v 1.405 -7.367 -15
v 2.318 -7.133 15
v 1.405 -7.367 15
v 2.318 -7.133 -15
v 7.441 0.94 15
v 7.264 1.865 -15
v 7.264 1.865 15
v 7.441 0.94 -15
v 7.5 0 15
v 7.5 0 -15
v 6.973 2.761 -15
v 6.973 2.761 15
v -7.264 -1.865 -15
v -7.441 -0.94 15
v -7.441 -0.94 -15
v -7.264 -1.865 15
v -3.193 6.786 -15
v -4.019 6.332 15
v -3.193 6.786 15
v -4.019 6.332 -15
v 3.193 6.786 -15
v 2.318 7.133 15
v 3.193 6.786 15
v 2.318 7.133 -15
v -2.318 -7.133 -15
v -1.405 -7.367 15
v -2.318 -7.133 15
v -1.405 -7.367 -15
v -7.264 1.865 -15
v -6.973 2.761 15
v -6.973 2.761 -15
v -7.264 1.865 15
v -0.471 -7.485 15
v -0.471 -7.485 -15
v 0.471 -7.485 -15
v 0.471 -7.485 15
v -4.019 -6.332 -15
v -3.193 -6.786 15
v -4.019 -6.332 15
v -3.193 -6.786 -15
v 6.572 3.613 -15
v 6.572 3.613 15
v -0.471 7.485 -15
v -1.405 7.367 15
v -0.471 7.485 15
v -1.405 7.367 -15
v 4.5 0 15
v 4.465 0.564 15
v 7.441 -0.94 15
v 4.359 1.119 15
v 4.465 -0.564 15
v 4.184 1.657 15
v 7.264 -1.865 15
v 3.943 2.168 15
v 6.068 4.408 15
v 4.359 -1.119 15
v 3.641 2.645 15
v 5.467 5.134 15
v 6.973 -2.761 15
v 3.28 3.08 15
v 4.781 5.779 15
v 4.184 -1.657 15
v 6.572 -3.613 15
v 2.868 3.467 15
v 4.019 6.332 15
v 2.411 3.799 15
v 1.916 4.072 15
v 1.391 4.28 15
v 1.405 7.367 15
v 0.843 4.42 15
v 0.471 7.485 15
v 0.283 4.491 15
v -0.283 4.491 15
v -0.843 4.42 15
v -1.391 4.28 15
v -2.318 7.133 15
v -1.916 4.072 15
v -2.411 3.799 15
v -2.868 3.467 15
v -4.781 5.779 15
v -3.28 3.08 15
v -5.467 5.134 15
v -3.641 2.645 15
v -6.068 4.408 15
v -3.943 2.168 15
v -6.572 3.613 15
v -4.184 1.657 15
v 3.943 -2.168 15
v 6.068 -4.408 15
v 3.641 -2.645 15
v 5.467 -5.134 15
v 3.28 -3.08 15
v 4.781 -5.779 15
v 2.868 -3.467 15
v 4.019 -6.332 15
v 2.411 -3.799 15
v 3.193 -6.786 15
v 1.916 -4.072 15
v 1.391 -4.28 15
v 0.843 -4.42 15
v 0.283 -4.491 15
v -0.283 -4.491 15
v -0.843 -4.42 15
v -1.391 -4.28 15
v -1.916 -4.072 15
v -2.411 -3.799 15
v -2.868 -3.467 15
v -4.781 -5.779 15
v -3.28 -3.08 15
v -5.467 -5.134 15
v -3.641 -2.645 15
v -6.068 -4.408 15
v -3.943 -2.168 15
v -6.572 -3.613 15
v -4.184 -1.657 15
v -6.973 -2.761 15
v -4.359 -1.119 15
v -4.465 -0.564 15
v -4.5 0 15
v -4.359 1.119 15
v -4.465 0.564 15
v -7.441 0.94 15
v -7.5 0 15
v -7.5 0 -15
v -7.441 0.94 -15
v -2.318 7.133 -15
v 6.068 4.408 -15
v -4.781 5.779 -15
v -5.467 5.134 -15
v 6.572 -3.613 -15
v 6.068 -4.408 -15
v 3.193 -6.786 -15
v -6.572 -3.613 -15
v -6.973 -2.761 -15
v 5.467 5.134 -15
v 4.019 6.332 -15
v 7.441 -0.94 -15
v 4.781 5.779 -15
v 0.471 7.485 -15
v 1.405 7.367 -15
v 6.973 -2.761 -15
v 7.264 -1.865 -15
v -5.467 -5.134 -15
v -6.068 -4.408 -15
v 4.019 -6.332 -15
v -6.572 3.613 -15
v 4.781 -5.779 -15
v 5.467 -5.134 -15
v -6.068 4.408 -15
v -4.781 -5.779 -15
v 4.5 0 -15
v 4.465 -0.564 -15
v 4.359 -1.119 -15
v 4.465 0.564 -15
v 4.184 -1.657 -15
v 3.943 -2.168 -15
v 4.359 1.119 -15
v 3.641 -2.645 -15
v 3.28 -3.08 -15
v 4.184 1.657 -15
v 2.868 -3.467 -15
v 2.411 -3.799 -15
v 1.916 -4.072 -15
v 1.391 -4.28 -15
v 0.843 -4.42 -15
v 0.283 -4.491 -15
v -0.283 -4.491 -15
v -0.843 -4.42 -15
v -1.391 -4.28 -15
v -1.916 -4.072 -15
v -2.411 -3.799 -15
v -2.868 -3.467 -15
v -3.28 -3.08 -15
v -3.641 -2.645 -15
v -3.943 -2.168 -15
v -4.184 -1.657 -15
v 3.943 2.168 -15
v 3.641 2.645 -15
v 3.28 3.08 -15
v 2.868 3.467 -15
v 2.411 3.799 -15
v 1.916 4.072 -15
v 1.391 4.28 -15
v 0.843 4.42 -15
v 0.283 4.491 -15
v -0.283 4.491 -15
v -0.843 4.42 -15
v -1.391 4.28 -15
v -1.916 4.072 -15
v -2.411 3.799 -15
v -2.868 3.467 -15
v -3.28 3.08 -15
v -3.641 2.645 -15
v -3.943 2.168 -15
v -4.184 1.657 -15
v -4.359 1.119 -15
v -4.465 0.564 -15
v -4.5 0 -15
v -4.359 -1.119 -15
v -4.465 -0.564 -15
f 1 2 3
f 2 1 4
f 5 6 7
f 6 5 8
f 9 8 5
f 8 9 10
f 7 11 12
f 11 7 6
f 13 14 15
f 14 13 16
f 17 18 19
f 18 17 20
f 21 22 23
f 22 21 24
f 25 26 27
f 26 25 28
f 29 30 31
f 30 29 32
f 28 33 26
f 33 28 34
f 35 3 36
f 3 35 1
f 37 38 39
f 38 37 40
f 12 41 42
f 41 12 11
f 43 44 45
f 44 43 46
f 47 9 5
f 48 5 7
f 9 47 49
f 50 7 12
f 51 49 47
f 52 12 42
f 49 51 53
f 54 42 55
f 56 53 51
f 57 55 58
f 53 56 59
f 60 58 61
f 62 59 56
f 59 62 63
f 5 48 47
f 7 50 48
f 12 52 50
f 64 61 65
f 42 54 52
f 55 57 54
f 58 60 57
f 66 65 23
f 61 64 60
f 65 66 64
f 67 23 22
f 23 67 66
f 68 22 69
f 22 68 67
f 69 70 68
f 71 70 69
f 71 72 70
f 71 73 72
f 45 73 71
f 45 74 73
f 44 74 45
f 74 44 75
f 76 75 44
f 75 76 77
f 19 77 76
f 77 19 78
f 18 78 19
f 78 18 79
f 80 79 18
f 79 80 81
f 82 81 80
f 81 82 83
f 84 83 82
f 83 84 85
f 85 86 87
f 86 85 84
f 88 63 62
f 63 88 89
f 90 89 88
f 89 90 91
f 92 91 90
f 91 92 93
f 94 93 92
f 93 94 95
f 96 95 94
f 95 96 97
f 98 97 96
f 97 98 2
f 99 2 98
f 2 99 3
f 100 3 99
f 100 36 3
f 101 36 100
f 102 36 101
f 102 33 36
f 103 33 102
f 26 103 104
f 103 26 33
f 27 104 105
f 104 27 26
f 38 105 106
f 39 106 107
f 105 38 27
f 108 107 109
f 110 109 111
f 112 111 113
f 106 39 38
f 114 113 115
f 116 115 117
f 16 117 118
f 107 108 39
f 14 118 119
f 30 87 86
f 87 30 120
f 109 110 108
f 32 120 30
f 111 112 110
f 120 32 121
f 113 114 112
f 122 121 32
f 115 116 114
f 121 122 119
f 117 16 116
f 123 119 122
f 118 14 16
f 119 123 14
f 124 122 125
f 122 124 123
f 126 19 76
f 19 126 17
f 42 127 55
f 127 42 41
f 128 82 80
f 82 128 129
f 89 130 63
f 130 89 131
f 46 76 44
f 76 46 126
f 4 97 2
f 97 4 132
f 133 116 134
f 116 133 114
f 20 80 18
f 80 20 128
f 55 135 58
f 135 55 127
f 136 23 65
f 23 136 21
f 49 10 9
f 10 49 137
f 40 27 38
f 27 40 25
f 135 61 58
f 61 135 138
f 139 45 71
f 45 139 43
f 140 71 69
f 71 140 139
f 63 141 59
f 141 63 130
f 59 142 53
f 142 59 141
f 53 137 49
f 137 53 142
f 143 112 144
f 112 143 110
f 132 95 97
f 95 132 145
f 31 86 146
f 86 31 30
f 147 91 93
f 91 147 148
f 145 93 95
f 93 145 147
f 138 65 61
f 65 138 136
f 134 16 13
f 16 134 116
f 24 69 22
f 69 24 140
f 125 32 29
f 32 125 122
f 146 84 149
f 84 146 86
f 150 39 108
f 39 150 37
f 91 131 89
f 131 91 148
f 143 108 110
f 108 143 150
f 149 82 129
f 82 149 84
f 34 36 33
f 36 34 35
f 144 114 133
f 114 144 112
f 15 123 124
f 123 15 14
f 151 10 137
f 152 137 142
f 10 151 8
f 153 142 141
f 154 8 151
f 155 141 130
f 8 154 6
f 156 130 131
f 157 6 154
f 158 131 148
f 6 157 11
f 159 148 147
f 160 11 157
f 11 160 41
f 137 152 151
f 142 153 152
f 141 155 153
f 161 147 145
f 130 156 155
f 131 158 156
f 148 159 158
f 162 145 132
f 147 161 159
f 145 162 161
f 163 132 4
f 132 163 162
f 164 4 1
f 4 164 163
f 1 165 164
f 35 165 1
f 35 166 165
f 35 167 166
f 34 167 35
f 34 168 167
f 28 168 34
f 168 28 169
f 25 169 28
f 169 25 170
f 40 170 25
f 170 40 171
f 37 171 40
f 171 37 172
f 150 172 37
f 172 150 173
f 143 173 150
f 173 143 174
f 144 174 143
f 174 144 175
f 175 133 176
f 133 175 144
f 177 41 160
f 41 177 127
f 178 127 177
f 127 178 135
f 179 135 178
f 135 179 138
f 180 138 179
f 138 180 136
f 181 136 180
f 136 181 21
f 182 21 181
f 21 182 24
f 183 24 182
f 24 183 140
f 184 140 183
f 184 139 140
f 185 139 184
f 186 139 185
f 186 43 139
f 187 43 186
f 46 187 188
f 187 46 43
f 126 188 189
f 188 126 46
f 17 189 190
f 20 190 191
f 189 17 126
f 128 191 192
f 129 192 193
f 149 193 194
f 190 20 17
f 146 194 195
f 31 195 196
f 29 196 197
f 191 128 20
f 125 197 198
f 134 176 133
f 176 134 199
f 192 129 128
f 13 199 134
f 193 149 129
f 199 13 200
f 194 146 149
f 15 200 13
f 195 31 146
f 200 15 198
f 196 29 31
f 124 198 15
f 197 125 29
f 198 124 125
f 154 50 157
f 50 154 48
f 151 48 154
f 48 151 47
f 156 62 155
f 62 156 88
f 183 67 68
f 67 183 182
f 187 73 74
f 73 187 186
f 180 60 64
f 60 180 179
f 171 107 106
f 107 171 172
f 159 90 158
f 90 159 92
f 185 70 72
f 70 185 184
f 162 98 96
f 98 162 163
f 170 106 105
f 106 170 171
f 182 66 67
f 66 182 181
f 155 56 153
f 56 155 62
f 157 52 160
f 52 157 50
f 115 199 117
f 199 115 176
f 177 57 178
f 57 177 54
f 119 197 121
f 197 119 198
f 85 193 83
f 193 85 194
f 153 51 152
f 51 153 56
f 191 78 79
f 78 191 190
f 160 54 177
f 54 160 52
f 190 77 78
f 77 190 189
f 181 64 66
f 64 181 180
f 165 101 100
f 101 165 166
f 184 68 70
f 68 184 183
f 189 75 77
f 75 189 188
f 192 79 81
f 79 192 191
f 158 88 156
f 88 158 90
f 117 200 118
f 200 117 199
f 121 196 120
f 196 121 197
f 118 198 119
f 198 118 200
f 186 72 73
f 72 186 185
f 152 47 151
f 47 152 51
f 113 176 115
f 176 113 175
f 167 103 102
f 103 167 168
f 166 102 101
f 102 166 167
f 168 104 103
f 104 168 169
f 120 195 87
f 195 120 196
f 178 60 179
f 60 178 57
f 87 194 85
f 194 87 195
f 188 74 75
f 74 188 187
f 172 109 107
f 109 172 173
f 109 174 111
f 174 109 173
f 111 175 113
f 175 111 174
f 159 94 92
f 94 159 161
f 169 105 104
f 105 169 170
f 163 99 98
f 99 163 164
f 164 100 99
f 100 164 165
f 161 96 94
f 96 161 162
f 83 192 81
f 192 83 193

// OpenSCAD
$fn = 50;


difference() {
	union() {
		translate(v = [0, 0, -15.0000000000]) {
			cylinder(h = 30, r = 7.5000000000);
		}
	}
	union() {
		translate(v = [0, 0, -100.0000000000]) {
			cylinder(h = 200, r = 4.5000000000);
		}
	}
}
